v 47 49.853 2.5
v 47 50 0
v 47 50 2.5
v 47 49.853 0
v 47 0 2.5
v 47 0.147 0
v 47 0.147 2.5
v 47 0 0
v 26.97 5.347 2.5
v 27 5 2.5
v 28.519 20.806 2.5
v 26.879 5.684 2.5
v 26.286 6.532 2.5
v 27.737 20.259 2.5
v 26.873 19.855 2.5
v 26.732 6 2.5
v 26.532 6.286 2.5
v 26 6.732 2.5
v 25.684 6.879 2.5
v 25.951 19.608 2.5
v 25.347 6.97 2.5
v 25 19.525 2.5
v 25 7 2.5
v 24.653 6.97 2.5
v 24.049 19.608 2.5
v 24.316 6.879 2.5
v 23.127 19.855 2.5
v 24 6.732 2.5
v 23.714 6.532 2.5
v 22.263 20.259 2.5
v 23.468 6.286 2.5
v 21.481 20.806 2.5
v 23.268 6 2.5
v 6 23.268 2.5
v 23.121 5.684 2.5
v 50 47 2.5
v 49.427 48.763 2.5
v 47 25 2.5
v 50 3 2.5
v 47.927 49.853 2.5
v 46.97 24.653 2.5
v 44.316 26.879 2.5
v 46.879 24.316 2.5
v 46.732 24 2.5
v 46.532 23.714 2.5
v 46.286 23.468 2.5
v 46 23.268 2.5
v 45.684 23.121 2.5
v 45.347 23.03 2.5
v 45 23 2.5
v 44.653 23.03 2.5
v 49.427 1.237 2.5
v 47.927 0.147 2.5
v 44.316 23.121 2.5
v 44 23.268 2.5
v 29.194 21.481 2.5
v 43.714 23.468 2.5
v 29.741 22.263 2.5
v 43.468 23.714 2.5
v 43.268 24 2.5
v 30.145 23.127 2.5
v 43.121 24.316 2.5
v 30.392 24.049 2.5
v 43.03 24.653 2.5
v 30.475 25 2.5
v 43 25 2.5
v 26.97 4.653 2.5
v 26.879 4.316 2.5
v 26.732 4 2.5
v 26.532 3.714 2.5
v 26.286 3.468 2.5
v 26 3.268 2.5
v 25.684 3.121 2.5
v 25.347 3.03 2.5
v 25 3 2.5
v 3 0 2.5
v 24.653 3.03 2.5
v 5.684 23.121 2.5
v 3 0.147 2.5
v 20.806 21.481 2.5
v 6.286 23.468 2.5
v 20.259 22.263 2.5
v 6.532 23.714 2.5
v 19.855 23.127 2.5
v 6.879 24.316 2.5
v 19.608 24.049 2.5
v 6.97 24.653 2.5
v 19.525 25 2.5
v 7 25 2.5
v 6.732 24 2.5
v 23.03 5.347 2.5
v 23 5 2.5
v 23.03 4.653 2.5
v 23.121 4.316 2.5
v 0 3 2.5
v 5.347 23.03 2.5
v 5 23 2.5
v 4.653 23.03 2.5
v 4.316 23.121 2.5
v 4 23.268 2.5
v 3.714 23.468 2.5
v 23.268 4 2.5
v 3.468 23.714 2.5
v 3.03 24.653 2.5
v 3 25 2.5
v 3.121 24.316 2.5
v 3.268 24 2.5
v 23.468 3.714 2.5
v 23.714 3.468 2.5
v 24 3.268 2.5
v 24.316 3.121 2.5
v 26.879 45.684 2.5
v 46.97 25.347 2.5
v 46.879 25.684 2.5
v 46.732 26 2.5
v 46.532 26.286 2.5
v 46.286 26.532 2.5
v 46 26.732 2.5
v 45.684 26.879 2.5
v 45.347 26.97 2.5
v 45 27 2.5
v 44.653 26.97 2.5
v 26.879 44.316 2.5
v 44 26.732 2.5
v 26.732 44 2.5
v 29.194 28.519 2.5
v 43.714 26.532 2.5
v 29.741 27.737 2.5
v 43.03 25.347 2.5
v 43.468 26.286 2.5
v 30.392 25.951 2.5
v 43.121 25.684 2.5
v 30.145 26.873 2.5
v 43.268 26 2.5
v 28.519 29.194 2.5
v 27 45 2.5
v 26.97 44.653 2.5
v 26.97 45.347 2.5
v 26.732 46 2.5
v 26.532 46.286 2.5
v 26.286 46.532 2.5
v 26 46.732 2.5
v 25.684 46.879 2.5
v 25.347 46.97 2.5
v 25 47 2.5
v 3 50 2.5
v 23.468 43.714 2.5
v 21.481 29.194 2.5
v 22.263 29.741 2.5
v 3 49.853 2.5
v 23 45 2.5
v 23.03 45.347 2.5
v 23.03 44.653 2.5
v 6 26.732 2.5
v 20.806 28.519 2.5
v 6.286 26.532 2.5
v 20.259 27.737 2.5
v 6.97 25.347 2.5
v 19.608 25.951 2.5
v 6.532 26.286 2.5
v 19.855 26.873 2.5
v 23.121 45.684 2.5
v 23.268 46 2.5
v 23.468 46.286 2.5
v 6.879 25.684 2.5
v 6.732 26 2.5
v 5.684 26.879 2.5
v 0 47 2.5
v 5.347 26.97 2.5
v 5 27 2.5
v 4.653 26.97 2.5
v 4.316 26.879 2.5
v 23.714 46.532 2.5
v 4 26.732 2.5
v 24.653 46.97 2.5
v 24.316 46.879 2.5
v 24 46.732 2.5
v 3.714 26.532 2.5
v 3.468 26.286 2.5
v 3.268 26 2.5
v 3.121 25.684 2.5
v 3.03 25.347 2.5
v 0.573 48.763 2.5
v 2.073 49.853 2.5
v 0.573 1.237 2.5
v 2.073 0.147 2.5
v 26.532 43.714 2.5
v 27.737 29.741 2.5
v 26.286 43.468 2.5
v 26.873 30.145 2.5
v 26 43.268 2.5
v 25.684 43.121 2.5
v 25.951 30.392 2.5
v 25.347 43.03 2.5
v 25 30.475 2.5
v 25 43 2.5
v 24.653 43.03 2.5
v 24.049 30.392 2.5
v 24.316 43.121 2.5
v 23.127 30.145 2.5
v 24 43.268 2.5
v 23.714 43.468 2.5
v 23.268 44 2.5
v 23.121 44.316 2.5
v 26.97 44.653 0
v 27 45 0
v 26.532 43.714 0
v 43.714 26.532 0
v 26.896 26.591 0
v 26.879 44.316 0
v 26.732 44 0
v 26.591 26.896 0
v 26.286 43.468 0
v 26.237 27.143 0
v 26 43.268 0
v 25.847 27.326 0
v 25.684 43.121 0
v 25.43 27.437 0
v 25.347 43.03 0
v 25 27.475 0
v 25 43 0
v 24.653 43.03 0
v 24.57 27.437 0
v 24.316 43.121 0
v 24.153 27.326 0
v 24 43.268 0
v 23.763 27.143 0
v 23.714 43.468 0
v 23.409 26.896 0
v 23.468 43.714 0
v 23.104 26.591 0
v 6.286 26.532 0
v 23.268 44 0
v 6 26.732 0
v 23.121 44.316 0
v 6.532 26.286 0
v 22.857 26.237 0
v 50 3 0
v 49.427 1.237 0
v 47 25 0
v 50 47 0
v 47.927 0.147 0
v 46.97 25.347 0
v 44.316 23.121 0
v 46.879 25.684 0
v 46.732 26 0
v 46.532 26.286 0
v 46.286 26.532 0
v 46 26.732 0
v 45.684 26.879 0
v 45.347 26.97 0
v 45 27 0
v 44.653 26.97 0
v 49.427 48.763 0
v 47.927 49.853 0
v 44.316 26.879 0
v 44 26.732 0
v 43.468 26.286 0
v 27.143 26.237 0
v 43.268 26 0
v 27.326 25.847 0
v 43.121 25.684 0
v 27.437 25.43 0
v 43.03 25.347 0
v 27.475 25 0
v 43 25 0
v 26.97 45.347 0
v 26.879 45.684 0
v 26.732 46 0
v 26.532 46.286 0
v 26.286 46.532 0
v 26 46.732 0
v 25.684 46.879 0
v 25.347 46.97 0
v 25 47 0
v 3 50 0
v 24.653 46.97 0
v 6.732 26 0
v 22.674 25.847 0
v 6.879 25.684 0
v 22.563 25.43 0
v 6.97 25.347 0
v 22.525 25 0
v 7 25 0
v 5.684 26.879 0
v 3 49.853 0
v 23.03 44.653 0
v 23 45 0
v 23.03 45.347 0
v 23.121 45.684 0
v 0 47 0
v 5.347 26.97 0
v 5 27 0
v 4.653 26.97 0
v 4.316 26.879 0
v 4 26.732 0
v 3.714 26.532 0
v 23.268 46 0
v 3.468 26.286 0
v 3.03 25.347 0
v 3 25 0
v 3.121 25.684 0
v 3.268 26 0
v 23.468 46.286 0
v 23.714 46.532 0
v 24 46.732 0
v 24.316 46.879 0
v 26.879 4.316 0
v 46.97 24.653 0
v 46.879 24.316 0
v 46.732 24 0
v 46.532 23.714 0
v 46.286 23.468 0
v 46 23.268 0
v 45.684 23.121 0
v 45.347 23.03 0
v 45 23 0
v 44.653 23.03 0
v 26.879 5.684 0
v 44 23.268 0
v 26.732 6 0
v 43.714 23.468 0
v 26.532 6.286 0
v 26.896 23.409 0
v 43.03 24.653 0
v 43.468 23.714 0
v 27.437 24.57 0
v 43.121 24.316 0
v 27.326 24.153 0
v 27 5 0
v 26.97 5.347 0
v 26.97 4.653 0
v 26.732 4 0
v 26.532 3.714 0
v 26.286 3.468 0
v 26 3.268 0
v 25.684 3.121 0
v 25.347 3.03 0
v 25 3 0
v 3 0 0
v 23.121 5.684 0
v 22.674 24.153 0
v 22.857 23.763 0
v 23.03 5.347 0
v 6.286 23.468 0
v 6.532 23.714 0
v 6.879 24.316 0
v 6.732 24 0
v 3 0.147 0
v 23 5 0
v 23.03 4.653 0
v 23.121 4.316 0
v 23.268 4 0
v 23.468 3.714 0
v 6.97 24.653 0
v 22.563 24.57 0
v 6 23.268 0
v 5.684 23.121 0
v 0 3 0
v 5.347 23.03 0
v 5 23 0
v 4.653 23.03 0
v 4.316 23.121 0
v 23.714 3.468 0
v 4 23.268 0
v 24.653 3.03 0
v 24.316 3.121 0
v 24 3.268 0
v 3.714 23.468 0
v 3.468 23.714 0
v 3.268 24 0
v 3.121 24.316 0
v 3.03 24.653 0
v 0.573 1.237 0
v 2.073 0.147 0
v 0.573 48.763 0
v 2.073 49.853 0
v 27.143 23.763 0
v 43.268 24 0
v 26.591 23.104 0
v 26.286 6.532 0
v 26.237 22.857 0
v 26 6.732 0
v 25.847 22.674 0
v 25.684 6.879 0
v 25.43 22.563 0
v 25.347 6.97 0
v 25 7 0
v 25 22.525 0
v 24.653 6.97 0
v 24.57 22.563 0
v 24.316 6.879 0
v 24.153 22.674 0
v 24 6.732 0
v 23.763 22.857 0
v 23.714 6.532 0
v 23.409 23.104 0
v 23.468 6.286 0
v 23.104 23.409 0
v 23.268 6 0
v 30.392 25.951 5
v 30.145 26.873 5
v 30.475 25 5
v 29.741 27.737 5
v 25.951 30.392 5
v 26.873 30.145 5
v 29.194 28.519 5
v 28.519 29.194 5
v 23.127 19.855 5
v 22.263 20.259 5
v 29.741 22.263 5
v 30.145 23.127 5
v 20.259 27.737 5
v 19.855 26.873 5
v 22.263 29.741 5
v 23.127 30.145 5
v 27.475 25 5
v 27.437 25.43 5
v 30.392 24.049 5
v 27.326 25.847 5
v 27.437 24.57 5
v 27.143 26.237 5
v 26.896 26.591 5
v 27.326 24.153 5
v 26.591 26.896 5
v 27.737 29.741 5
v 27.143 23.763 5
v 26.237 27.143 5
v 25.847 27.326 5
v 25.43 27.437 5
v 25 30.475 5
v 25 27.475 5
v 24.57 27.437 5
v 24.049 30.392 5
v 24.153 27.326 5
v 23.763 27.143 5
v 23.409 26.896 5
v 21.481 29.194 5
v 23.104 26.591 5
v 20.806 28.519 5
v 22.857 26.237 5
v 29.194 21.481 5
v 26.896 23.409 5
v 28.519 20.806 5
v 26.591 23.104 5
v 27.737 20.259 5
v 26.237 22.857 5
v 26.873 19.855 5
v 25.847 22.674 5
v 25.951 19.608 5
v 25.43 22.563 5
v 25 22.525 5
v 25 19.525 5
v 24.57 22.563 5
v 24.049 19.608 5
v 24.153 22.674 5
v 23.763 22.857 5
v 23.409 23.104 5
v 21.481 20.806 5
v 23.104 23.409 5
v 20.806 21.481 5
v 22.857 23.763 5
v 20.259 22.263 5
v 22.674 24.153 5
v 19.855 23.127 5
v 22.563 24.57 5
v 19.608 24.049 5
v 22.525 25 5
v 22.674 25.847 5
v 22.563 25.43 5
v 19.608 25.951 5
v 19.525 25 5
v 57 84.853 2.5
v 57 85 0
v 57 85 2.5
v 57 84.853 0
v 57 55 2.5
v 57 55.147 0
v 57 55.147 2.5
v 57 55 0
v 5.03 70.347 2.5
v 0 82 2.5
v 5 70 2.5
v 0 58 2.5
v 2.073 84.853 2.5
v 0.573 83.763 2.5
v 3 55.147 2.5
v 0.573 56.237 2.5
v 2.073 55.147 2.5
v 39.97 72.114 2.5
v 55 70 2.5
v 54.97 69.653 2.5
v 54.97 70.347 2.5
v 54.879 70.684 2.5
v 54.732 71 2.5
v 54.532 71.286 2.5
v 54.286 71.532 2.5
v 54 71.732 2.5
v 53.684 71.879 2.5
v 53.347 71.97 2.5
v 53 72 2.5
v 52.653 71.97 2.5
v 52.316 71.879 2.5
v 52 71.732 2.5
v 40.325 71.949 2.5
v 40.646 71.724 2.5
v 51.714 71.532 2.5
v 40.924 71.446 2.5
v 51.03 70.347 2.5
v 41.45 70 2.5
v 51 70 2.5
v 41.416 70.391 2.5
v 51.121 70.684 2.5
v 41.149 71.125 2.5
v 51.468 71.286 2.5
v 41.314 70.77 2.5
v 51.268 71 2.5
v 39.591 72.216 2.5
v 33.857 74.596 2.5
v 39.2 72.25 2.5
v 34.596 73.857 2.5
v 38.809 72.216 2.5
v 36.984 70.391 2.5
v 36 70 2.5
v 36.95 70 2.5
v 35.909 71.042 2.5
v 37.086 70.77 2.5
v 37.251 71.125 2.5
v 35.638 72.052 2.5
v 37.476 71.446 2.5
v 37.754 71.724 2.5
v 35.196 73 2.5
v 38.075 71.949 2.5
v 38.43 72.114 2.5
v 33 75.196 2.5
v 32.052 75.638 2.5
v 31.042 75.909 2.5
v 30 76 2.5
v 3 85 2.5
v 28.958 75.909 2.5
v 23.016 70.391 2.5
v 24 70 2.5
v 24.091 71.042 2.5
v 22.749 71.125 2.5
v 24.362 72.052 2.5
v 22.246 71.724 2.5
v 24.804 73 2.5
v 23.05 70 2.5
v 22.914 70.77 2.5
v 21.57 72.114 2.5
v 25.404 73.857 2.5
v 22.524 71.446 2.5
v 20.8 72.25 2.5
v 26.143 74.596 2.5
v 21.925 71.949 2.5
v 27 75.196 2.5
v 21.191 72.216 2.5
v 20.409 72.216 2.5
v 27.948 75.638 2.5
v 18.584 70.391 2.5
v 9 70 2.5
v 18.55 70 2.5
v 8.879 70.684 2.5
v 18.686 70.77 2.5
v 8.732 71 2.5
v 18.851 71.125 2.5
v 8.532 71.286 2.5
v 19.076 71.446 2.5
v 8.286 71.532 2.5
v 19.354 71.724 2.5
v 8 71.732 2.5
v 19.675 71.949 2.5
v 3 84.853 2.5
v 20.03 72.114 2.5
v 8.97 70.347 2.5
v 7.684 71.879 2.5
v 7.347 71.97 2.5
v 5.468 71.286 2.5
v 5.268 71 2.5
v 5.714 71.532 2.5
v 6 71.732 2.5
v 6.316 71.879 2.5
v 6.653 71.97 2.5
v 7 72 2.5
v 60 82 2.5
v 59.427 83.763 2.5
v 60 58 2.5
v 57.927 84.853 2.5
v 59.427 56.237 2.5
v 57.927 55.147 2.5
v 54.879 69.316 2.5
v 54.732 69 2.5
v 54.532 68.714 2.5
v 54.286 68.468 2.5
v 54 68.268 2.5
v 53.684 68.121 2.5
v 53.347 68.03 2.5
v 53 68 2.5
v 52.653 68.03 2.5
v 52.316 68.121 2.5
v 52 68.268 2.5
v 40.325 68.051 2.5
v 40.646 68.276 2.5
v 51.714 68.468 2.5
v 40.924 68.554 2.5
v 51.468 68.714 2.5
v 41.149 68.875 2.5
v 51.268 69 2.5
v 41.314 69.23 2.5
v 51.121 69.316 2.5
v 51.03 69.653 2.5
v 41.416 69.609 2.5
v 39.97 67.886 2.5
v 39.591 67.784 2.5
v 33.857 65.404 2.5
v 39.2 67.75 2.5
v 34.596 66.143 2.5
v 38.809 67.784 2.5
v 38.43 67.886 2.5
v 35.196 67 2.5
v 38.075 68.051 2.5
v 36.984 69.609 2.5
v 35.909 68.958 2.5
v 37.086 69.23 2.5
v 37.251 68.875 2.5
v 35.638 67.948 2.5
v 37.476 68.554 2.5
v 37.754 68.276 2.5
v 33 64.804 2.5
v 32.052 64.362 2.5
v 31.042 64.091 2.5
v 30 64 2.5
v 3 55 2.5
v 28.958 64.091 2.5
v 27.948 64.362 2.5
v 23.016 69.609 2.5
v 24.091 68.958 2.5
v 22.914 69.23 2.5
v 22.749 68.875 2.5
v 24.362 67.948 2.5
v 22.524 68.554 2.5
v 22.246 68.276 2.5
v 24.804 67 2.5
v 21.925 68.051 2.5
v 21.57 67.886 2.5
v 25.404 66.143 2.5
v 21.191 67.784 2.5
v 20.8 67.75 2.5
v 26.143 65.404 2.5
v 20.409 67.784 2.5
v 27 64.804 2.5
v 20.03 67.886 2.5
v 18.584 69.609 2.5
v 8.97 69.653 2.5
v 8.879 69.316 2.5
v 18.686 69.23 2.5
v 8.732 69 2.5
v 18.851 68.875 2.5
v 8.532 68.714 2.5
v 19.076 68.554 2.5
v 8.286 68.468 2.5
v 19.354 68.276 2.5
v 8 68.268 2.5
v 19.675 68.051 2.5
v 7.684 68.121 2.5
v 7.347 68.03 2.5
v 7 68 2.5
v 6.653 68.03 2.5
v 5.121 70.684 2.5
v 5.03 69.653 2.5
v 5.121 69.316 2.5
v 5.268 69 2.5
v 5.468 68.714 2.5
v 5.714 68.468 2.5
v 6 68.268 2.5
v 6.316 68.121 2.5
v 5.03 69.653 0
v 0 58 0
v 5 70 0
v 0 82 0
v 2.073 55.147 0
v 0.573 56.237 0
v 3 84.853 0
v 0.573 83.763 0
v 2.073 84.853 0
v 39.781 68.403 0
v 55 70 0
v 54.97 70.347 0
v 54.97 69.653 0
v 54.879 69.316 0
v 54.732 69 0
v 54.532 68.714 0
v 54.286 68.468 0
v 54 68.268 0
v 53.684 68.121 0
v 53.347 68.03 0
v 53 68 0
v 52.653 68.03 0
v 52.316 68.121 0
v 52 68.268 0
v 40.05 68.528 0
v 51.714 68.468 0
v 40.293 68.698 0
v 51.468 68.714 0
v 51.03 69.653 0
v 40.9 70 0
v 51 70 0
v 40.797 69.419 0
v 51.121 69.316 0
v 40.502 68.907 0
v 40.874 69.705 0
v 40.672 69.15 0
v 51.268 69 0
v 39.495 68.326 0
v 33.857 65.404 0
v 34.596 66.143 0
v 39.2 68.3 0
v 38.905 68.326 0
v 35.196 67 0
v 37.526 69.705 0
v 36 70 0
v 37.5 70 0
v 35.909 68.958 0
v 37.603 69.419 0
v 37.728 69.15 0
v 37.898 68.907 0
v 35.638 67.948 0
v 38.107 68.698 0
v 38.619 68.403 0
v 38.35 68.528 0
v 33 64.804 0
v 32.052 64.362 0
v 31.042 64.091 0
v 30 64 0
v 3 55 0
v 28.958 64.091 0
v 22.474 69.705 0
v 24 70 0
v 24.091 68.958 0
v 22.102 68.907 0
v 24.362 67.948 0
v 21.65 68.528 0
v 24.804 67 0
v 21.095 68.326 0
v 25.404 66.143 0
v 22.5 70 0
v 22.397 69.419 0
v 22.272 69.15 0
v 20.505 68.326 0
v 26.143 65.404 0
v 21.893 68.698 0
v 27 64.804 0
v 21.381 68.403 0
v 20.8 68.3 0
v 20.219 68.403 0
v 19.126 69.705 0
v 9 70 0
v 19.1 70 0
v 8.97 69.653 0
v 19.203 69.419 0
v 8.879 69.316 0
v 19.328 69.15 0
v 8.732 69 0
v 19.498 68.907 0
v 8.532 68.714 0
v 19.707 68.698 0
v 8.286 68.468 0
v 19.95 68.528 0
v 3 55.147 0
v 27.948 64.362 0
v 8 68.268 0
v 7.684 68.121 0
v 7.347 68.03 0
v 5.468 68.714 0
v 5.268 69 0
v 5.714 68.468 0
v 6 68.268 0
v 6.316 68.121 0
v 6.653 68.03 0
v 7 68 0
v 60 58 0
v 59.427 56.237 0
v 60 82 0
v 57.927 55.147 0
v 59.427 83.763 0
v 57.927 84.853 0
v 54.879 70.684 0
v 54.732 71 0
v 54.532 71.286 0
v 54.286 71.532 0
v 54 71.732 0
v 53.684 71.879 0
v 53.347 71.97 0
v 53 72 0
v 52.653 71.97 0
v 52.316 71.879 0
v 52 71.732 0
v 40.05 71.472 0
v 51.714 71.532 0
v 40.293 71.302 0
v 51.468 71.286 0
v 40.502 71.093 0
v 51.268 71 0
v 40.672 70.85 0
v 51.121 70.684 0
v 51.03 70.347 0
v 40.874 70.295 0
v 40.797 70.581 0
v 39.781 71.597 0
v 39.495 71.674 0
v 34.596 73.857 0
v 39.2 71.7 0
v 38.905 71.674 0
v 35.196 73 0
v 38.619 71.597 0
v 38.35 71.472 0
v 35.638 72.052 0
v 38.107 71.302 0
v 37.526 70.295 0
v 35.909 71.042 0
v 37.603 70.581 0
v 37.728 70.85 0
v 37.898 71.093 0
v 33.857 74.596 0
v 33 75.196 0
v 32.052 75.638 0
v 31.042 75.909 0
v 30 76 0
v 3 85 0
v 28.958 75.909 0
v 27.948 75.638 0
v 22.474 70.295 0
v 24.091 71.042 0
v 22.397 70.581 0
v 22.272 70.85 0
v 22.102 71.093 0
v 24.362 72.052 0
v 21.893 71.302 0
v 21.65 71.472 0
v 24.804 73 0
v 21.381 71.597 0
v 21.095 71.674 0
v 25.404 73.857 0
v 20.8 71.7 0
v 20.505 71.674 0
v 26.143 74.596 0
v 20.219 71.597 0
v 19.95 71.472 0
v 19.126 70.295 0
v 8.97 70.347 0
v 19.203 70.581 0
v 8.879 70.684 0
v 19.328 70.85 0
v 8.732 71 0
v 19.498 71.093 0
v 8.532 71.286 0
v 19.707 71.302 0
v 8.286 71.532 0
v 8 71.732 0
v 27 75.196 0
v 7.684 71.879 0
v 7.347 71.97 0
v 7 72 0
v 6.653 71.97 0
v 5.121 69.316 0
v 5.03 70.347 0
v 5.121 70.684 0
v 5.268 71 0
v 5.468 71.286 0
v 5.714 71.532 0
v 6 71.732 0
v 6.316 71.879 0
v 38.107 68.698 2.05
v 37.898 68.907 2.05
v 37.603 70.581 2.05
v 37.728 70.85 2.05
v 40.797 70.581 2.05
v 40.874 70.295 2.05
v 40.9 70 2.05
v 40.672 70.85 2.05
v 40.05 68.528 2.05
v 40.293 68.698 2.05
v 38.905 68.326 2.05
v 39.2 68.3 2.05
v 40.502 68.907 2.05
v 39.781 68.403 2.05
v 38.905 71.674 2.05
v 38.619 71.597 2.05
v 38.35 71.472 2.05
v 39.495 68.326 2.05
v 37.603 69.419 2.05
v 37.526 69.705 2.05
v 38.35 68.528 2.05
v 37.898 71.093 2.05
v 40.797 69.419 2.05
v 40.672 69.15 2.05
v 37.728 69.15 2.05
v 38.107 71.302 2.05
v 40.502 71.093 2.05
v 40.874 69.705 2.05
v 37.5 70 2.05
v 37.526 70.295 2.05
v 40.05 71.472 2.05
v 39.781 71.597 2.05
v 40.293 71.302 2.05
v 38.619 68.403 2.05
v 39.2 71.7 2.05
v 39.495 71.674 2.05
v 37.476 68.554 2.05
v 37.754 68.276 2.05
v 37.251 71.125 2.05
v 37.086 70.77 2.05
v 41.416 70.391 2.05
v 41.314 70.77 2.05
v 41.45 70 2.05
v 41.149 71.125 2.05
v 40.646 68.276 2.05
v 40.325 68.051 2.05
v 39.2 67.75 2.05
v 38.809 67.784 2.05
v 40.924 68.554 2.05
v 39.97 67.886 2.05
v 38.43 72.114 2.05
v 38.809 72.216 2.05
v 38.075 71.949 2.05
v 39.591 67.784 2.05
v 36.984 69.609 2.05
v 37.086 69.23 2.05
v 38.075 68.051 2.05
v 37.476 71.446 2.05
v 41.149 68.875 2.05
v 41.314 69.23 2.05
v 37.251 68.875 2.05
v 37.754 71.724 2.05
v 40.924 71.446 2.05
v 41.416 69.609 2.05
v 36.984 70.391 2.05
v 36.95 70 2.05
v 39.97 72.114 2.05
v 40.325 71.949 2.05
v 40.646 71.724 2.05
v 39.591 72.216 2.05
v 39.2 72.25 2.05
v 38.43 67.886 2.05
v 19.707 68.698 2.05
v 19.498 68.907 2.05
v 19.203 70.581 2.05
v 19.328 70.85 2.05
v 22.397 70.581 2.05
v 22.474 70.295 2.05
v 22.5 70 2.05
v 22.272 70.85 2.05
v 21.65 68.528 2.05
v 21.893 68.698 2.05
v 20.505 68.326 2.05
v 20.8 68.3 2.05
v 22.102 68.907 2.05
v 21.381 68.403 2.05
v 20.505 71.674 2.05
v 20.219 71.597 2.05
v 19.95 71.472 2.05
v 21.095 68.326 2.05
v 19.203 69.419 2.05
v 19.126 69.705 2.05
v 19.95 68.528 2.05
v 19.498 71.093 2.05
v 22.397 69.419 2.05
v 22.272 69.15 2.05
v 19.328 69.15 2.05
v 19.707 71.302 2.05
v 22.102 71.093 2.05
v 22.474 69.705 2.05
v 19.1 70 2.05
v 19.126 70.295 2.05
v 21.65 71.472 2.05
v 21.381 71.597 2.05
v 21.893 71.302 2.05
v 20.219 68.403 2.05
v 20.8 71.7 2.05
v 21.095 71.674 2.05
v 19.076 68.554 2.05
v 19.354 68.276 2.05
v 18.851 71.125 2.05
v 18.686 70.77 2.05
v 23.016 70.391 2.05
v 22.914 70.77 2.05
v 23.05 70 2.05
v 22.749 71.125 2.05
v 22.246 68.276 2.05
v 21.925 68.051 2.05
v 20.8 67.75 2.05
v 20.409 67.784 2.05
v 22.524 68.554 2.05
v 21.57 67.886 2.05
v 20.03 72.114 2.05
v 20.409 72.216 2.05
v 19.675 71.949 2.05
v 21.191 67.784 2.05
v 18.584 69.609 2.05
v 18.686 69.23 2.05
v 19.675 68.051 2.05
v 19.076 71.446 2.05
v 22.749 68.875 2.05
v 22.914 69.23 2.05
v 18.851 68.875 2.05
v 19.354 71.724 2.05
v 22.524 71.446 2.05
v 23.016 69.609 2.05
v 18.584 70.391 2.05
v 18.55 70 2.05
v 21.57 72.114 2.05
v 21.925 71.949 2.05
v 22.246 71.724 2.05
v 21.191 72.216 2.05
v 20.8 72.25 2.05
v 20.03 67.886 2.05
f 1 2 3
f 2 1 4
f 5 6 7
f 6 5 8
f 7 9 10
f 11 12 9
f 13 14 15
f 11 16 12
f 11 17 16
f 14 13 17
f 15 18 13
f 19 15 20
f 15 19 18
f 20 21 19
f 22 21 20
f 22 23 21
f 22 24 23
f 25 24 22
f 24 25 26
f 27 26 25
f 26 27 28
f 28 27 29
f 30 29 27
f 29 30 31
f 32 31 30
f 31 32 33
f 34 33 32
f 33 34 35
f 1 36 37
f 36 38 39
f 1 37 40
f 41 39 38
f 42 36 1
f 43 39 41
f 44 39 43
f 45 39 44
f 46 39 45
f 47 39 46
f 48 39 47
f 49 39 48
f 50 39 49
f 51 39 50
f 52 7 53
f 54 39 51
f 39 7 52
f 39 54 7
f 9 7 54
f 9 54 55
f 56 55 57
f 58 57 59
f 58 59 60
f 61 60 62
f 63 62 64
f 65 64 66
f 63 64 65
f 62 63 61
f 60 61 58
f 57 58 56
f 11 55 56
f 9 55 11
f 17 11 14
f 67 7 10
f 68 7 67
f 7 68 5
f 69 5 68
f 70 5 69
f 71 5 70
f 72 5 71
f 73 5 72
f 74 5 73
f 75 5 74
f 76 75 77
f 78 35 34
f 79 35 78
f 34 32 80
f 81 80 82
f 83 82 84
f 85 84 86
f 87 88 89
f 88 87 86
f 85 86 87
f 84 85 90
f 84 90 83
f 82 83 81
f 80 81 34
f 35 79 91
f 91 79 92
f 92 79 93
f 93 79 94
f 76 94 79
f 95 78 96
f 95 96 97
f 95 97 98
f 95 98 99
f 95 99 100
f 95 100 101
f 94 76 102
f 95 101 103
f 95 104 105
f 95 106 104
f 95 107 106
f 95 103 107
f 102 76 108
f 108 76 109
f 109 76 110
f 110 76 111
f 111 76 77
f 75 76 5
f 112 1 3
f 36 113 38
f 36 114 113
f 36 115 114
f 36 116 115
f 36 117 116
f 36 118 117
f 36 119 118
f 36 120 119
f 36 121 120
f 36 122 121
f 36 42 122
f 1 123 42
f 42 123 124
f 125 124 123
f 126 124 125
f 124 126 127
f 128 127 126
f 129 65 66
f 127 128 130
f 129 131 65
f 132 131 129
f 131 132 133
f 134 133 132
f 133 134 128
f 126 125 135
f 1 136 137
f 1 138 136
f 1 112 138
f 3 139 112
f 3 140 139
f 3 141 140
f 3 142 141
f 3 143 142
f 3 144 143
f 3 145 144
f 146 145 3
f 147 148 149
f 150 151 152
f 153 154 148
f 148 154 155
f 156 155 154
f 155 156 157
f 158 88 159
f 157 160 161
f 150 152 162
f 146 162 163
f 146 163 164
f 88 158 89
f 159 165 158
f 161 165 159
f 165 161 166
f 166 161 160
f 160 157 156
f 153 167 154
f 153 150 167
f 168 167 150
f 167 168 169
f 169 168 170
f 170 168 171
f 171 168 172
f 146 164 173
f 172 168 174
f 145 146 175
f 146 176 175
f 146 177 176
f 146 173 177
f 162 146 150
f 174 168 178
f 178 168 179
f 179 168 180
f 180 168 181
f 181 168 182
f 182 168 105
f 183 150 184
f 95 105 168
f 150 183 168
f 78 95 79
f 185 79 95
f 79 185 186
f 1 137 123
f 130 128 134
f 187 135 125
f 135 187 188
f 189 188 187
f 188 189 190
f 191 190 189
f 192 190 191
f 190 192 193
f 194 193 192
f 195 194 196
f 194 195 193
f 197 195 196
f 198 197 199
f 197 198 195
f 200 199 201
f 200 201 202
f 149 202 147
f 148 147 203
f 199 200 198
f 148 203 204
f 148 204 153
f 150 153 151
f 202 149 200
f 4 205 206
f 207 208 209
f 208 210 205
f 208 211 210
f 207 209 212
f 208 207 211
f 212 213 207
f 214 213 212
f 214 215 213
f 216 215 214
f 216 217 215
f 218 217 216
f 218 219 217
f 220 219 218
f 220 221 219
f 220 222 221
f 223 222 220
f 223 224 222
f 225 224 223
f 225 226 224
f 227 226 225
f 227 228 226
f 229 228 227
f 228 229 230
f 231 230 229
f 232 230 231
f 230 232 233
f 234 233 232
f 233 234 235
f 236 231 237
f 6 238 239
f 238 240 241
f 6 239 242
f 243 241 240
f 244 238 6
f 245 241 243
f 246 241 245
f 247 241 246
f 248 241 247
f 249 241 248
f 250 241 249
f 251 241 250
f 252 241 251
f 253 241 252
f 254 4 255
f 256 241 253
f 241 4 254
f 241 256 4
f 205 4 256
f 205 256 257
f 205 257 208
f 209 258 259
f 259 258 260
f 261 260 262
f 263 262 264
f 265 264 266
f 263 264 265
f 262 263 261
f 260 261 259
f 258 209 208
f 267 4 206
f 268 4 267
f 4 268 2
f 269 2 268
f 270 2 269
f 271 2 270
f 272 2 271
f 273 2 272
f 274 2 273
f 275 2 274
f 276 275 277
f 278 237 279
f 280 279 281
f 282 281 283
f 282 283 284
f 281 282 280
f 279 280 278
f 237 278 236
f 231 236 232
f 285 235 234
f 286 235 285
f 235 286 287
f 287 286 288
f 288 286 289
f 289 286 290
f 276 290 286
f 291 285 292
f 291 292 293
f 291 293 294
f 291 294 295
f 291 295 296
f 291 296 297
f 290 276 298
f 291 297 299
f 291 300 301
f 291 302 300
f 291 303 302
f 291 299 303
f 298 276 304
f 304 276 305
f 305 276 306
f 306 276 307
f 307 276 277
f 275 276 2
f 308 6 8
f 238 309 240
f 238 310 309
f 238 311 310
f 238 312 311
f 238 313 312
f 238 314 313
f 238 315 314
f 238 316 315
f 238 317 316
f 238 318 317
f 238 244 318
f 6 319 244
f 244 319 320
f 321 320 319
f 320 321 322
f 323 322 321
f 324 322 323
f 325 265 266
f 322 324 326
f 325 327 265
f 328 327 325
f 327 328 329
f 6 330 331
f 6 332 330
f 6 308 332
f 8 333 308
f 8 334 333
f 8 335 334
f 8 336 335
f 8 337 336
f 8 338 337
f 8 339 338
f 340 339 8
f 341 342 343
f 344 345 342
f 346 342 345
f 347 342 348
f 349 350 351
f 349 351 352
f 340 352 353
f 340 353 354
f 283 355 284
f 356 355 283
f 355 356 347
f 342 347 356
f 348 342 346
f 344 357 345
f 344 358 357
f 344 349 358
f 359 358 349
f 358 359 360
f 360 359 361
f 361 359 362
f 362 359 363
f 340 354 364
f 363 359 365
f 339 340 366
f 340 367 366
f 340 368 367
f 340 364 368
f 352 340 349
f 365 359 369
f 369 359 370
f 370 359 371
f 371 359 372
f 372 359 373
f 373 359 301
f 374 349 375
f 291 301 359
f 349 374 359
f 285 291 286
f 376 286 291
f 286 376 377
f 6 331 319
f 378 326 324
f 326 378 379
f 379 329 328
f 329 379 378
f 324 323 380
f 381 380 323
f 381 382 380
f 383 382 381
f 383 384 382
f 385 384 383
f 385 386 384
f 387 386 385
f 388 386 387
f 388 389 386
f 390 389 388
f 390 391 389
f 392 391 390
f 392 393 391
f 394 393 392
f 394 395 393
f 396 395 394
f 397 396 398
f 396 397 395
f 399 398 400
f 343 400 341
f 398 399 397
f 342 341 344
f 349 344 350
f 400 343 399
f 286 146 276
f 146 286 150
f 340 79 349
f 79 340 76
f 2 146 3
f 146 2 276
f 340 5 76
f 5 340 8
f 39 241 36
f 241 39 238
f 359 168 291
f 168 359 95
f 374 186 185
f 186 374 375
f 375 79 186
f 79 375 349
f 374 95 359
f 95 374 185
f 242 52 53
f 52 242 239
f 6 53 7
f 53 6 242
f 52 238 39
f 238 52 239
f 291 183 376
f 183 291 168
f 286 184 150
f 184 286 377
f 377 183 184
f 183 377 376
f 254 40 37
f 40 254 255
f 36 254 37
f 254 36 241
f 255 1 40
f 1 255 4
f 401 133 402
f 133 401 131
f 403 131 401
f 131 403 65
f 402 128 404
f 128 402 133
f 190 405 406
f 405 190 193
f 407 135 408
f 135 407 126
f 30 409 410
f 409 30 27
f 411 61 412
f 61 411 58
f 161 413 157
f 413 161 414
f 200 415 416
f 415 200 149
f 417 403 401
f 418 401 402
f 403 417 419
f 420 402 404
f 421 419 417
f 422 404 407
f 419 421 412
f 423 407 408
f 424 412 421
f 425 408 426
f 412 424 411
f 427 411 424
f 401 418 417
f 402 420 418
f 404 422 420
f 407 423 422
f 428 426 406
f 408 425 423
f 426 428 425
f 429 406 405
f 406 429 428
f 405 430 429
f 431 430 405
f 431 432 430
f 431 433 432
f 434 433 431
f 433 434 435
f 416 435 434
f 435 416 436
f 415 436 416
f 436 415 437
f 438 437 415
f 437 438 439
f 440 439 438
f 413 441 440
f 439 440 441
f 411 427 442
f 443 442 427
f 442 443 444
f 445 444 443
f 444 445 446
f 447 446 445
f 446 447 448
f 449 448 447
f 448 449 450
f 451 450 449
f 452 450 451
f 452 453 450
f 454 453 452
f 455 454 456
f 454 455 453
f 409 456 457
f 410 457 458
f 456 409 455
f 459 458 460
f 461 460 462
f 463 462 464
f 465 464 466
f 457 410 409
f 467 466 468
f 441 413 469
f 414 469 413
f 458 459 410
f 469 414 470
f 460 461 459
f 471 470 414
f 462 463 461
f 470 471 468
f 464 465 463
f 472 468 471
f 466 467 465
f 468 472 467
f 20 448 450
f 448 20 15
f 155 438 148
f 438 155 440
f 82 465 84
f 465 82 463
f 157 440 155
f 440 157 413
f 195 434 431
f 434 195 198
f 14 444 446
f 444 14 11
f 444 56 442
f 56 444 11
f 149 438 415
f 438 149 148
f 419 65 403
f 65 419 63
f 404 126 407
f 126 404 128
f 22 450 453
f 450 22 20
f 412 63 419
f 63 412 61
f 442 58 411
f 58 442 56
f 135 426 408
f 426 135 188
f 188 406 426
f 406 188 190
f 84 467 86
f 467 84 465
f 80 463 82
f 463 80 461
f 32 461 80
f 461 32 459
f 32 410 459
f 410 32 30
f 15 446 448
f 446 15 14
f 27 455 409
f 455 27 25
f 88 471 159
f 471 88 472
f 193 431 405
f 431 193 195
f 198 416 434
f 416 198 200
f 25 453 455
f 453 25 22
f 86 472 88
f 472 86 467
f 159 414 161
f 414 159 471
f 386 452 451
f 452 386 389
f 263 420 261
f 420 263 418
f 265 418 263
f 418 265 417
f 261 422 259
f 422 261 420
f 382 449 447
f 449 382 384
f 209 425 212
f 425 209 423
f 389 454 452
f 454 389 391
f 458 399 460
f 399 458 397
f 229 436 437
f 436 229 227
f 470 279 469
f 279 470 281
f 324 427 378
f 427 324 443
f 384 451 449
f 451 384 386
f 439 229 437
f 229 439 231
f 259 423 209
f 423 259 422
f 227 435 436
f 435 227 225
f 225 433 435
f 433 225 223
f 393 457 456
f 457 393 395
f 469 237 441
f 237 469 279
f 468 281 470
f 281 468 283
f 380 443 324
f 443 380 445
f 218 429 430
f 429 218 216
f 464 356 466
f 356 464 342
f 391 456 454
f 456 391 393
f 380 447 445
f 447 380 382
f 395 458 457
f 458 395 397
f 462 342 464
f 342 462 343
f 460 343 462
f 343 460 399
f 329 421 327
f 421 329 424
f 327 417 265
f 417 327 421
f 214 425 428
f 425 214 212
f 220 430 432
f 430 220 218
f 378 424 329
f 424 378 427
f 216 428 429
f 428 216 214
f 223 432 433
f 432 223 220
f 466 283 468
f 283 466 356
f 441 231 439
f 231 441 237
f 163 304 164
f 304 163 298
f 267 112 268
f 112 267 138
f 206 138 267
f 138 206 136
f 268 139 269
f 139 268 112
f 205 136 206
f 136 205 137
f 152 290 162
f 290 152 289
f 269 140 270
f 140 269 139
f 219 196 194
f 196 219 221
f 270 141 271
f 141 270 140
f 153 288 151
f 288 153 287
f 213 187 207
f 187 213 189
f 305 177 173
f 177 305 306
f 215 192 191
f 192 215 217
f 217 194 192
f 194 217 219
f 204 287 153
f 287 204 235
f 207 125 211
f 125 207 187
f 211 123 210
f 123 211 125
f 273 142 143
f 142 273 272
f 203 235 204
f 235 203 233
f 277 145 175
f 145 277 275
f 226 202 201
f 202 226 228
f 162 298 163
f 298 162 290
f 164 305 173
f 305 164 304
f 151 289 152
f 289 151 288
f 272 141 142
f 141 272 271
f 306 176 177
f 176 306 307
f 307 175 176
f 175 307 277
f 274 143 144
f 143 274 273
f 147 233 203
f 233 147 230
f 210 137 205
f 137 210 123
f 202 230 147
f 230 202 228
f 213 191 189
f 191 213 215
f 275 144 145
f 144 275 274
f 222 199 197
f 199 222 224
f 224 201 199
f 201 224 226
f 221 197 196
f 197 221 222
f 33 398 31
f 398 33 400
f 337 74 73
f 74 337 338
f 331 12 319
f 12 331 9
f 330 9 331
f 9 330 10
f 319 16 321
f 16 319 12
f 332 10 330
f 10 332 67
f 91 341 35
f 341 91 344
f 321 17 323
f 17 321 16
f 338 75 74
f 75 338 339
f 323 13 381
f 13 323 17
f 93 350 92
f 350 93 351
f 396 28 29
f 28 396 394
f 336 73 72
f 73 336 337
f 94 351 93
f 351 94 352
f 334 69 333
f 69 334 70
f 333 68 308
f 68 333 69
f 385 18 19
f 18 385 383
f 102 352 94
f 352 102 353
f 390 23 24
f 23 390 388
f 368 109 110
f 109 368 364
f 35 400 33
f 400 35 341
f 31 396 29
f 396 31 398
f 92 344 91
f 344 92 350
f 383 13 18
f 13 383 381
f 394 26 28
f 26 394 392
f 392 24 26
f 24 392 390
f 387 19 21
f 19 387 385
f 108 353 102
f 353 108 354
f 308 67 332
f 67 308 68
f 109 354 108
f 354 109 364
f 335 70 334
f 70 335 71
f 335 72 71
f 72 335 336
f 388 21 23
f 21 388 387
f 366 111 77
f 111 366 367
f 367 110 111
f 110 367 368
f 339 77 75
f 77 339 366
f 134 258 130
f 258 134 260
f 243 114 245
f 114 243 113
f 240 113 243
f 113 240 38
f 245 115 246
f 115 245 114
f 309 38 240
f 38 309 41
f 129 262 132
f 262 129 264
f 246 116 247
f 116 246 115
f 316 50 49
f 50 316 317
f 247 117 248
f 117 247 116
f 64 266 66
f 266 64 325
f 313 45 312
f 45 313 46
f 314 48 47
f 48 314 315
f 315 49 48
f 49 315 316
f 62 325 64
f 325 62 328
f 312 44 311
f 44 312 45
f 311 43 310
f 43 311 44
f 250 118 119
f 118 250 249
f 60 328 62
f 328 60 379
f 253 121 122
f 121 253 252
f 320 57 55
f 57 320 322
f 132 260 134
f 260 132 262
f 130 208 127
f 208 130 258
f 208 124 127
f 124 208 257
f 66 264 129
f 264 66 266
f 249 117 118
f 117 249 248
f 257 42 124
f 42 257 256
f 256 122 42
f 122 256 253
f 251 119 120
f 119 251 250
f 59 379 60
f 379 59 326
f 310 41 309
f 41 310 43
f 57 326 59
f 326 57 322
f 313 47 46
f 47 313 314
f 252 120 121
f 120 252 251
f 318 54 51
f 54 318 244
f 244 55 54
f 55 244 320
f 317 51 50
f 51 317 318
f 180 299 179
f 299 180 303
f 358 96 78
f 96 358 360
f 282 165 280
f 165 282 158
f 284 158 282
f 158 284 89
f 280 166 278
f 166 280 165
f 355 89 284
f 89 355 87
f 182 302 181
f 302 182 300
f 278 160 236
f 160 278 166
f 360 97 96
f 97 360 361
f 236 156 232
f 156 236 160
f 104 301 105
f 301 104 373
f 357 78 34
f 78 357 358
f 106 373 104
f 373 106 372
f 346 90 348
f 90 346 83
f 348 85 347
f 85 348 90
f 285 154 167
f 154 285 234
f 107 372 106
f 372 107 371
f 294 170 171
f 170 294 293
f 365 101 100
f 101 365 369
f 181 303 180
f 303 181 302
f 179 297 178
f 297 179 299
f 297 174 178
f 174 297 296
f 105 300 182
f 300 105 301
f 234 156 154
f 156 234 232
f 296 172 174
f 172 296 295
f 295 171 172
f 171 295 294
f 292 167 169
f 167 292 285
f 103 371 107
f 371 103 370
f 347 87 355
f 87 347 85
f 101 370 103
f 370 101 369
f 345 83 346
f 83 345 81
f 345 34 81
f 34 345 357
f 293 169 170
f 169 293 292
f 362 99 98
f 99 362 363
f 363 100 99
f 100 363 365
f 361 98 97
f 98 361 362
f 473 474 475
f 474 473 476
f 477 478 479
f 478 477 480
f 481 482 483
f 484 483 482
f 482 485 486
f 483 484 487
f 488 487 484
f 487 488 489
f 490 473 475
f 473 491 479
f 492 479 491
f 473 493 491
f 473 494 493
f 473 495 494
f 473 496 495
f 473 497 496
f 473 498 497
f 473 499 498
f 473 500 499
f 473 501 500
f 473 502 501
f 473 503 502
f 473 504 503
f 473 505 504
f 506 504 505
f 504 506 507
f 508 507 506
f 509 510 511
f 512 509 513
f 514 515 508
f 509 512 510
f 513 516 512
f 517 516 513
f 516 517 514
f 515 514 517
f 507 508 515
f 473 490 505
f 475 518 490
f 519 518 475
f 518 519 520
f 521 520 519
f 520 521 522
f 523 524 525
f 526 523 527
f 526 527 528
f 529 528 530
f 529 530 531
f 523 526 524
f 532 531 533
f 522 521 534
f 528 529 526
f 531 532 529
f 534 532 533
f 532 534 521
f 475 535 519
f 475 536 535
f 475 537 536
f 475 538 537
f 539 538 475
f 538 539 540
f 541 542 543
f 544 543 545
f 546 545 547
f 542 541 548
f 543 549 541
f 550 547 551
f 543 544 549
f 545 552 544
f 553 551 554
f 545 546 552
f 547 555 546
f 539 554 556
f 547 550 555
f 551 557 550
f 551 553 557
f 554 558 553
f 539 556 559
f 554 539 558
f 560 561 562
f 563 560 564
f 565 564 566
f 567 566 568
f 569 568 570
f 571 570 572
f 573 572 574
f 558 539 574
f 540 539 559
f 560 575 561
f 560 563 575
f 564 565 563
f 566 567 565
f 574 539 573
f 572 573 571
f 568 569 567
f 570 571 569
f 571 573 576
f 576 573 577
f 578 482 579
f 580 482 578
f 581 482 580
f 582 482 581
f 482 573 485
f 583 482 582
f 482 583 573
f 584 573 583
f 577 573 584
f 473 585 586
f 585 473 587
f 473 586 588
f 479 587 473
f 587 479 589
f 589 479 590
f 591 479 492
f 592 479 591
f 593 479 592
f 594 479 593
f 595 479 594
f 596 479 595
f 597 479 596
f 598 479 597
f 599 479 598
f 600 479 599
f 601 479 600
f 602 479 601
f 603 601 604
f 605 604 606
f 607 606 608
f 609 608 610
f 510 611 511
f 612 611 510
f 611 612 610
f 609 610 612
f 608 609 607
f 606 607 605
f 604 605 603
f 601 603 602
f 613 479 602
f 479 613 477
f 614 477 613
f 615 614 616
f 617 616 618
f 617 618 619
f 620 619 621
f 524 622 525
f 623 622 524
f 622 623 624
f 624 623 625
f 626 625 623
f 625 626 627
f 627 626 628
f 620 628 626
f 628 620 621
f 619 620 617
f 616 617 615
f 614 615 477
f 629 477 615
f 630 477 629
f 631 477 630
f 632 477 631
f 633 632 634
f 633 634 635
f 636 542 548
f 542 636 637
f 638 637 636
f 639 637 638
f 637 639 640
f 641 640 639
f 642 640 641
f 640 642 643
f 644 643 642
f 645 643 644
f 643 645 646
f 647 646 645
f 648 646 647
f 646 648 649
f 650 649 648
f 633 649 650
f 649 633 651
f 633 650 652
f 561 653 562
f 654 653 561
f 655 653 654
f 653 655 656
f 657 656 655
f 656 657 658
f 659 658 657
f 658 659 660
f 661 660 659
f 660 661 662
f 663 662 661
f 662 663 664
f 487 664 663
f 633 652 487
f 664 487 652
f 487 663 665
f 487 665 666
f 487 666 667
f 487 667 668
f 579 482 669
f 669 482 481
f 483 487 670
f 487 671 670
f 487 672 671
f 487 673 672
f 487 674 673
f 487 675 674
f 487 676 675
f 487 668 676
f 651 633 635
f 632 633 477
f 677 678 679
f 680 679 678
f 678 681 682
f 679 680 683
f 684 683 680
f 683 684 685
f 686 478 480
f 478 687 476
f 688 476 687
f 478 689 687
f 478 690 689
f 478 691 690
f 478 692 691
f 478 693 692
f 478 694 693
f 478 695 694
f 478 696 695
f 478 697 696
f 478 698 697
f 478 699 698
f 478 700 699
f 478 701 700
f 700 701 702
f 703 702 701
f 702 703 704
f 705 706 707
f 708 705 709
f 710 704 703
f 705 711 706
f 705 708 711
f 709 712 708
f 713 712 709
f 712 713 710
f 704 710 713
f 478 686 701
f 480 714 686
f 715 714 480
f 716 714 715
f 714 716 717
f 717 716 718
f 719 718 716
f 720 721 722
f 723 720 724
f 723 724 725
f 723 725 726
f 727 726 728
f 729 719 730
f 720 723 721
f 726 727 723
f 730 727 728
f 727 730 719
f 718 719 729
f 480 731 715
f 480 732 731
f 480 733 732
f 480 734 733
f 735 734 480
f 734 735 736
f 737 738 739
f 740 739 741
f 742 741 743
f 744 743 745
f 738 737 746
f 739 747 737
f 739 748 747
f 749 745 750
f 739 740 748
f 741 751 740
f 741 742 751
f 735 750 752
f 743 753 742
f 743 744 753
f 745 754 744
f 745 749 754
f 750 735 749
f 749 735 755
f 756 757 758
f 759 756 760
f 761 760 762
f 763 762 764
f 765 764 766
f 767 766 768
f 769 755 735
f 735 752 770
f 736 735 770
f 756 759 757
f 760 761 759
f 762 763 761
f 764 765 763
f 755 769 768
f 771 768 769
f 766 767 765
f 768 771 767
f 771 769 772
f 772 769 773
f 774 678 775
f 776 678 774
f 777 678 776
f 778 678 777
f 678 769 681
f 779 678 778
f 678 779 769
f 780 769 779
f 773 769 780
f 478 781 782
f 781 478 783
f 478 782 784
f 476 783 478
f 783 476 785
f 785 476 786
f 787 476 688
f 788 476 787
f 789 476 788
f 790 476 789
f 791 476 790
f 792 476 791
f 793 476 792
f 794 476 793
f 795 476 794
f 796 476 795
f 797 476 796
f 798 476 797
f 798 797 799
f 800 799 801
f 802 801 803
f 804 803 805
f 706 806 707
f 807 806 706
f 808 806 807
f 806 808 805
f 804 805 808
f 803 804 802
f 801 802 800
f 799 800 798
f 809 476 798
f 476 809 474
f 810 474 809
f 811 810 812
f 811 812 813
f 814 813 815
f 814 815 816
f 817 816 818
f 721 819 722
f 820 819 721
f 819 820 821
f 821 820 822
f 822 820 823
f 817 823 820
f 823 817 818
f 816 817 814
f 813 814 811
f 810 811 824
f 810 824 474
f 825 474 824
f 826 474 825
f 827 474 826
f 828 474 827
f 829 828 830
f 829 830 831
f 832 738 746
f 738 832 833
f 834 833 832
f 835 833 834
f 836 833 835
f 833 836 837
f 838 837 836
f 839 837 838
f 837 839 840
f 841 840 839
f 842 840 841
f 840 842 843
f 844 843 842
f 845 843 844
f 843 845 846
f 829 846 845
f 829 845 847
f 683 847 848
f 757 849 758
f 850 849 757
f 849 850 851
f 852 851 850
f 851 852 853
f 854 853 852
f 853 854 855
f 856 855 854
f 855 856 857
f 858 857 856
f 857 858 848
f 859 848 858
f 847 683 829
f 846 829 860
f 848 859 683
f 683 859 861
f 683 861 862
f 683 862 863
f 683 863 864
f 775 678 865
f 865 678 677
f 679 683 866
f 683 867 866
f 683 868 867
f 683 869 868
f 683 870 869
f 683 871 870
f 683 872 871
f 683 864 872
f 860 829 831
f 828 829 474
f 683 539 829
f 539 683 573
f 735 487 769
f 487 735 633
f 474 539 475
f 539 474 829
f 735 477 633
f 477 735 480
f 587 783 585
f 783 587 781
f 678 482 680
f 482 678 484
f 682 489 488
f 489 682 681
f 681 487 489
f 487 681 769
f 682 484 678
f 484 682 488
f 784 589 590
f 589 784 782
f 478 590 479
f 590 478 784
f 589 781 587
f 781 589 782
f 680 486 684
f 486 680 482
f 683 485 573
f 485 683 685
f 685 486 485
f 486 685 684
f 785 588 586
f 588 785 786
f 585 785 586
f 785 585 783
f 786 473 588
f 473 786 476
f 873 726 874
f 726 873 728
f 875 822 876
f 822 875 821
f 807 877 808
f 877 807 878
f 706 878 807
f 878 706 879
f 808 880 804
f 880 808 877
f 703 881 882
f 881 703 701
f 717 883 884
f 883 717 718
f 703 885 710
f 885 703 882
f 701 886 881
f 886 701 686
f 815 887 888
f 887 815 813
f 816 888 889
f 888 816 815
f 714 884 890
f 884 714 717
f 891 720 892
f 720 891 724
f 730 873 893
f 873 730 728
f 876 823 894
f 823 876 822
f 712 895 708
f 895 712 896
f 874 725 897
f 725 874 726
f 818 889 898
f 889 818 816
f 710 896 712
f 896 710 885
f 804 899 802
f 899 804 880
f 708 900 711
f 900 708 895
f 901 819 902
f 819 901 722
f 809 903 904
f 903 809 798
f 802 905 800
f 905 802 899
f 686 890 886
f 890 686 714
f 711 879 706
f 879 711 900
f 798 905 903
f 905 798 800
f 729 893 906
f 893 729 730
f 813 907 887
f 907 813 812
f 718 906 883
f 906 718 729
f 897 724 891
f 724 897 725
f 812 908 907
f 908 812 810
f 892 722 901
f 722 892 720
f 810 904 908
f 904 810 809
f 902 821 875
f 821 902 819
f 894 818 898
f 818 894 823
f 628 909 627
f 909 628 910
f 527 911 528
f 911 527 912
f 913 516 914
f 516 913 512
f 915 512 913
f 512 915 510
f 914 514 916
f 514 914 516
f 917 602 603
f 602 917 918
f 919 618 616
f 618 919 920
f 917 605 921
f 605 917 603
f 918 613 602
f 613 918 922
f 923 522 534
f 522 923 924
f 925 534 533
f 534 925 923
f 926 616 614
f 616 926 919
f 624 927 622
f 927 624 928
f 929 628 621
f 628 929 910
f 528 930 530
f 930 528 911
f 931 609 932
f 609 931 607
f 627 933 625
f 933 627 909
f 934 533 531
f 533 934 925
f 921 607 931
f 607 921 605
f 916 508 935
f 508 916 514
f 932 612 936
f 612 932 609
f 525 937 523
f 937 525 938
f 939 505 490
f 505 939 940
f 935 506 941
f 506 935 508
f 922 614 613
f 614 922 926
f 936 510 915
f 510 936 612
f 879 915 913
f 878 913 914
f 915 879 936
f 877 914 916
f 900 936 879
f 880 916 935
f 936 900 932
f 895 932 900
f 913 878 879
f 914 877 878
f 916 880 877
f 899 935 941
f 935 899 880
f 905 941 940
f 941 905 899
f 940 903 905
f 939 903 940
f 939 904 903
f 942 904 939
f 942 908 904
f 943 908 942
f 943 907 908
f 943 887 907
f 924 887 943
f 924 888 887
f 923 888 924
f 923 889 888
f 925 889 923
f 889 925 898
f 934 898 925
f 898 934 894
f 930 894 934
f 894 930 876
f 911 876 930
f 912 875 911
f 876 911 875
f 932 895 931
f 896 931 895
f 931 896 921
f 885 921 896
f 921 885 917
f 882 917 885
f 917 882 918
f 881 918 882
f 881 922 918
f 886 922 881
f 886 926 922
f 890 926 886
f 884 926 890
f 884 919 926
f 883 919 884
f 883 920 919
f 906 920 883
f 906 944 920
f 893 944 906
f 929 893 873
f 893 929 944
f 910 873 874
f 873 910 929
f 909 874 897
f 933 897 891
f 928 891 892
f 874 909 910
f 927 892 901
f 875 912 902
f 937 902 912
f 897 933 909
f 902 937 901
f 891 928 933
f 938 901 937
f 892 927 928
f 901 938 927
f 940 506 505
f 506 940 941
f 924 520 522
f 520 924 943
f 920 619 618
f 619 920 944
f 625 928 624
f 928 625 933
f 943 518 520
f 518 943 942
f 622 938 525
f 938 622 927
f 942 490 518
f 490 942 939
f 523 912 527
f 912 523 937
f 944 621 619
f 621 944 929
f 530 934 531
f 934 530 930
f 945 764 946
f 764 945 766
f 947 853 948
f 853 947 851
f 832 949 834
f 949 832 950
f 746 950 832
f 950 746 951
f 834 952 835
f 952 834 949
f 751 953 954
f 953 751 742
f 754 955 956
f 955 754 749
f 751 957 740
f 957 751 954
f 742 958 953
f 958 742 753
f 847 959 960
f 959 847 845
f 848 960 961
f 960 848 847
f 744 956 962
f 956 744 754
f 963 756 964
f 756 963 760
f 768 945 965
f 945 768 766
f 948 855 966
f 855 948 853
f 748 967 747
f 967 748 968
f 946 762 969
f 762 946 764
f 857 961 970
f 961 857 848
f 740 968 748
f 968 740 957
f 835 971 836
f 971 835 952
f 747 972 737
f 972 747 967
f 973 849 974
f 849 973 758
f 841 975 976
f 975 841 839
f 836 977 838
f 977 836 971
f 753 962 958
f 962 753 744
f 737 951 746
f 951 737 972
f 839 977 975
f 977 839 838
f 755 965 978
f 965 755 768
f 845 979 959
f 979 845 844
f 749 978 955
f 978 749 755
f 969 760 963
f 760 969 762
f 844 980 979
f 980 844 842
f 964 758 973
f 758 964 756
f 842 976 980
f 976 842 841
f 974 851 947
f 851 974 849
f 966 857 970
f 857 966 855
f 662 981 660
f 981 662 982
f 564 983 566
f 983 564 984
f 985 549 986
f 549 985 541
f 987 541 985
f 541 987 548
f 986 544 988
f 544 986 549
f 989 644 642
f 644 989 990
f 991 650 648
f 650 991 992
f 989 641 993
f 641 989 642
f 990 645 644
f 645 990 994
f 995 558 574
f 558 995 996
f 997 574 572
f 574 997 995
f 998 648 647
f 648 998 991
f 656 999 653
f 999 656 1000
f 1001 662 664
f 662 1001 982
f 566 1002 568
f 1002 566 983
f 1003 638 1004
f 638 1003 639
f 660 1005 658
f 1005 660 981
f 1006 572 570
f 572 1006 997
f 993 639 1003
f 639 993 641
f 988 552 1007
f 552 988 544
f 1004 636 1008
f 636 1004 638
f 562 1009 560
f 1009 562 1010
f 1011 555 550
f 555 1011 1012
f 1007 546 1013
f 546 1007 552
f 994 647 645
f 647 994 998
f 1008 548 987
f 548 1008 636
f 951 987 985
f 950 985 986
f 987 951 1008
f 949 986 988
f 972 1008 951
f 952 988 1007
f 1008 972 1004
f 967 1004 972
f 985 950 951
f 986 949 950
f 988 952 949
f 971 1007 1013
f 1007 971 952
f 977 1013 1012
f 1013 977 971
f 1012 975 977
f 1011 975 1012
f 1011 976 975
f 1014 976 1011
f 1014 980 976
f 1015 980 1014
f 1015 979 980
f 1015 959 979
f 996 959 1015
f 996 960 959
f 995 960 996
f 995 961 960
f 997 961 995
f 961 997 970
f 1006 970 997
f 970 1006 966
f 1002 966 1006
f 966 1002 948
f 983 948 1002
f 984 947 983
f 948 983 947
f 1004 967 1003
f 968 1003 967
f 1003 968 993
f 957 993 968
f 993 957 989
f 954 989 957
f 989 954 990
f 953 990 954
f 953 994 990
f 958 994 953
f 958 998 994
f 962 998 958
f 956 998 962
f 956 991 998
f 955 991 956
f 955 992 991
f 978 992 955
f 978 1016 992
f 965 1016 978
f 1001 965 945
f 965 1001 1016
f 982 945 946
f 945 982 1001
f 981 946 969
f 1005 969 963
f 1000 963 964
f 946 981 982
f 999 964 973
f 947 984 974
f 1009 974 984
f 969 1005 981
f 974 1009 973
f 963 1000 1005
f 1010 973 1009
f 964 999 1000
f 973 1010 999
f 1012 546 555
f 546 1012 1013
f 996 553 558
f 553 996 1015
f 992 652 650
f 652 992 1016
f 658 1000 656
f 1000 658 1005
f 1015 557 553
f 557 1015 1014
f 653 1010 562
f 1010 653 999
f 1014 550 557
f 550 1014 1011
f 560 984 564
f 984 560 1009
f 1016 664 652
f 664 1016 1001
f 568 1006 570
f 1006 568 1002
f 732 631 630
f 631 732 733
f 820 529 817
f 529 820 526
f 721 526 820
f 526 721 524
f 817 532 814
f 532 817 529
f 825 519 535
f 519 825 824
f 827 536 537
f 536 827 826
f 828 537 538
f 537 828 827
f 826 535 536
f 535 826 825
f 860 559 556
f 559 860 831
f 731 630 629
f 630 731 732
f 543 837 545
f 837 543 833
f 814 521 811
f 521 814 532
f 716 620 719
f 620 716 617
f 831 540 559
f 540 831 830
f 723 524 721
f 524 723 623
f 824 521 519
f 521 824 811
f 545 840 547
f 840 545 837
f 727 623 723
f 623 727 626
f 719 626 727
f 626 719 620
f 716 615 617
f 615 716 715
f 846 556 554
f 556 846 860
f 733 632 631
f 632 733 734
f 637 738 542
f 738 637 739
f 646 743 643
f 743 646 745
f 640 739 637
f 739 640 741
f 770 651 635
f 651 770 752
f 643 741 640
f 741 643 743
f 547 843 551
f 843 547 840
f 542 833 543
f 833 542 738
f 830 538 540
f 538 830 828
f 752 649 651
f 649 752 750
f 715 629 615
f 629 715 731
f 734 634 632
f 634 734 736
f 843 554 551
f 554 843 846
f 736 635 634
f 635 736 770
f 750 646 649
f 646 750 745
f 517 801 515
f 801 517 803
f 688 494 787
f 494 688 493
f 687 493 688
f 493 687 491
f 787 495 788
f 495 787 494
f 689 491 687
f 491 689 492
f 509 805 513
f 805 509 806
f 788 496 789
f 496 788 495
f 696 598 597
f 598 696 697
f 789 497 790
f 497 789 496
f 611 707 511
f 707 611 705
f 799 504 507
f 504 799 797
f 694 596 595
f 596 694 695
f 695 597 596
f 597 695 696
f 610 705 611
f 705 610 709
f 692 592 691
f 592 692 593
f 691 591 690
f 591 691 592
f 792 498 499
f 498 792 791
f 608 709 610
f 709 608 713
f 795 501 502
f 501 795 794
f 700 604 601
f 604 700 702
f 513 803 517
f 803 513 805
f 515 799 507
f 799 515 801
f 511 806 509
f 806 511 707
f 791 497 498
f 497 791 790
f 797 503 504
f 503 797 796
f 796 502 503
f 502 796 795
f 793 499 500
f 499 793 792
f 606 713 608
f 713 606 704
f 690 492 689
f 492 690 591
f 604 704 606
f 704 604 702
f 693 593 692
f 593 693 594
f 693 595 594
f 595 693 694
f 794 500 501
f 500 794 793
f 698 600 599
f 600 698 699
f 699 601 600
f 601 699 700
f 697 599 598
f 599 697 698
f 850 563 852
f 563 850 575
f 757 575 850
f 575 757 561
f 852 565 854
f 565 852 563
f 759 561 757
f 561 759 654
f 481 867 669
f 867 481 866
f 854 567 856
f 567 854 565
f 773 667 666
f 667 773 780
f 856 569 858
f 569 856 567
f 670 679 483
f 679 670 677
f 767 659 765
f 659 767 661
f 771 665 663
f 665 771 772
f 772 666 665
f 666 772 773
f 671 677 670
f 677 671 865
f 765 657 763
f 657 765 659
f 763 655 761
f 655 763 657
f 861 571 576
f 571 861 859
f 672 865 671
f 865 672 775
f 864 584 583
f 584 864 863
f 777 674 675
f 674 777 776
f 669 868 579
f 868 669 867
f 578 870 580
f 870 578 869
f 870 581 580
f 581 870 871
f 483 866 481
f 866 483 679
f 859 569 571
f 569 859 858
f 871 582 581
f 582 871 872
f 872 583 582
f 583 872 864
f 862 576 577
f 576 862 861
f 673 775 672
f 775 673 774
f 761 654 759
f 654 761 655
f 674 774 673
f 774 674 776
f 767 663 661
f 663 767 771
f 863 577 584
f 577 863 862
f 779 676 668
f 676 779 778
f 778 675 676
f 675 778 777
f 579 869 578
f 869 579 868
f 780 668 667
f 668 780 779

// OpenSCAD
// Customizable Rotable Bowden Extruder 
// preview[view:south, tilt:top];

// Which one would you like to see?
part = "both"; // [top:Motor Base,bottom:Bearing Base,both:Motor and Bearing Base]



/* [Motor Base] */

//Motor base width 
motor_base_size_x = 60;

//Motor base length 
motor_base_size_y = 30;

//Motor base height 
motor_base_size_z = 2.5;

//
bearing_top_central_hole_diameter =  12;

//
bearing_top_screw_head_diameter = 4.5;

//
bearing_top_screw_hole_diameter = 3.4;

//
bearing_top_screw_height = 4.5;

//distant between bearing top screw hole and the central
bearing_top_screw_hole_position = 9.2;

//motor width
motor_width = 42;

//
motor_holder_diameter = 4;


/* [Bearing Base] */

//Hard Disk bearing base width (mm)
bearing_base_size_x = 50;

//Hard Disk bearing base length 
bearing_base_size_y = 50;

//Hard Disk bearing base height 
bearing_base_size_z = 2.5;

//Central hole diameter    
base_central_hole_diameter = 4.95;

//Base screw diameter 
base_screw_diameter = 4;

//The distant between the screw and the central
base_screw_position = 20;



/* [Hidden] */
bearing_top_screw_head_hole_height = motor_base_size_z -bearing_top_screw_height/2;



module rounded(size, r) {
    //2 cube + 4 cylinder
    union() {
        translate([r, 0, 0]) cube([size[0]-2*r, size[1], size[2]]);
        translate([0, r, 0]) cube([size[0], size[1]-2*r, size[2]]);
        translate([r, r, 0]) cylinder(h=size[2], r=r);
        translate([size[0]-r, r, 0]) cylinder(h=size[2], r=r);
        translate([r, size[1]-r, 0]) cylinder(h=size[2], r=r);
        translate([size[0]-r, size[1]-r, 0]) cylinder(h=size[2], r=r);
    }
}

//bearing base
module bearingBase() {
    difference() {
        union() {
            //bearing base
            rounded([bearing_base_size_x, bearing_base_size_y, bearing_base_size_z], 3);
            //bearing central
            translate ([bearing_base_size_x/2,bearing_base_size_y/2,0]) {
                cylinder(h=(bearing_base_size_z+2.5), d=(base_central_hole_diameter+6),center=false, $fn=36);
            }
        }
        //bearing central hole
        translate ([bearing_base_size_x/2,bearing_base_size_y/2,-0.2]) {
            cylinder(h=bearing_base_size_z+2.5+1, d=base_central_hole_diameter, center=false, $fn=36);
        }
    
        //screw hole up
        translate ([bearing_base_size_x/2,bearing_base_size_y/2+base_screw_position,-0.2]) {
            cylinder(h=bearing_base_size_z+1, d=base_screw_diameter, center=false, $fn=36);
        }
    
        //screw hole down
        translate ([bearing_base_size_x/2,bearing_base_size_y/2-base_screw_position,-0.2]) {
            cylinder(h=bearing_base_size_z+1, d=base_screw_diameter, center=false, $fn=36);
        }

        //screw hole right
        translate ([bearing_base_size_x/2+base_screw_position,bearing_base_size_y/2, -0.2]) {
            cylinder(h=bearing_base_size_z+1, d=base_screw_diameter, center=false, $fn=36);
        }
    
        //screw hole left
        translate ([bearing_base_size_x/2-base_screw_position,bearing_base_size_y/2, -0.2]) {
            cylinder(h=bearing_base_size_z+10+1, d=base_screw_diameter, center=false, $fn=36);
        }
    }
}


//motor base
module motorBase () {
    difference() {
        //base
        rounded([motor_base_size_x, motor_base_size_y, motor_base_size_z], 3);
        //bearing top central hole 
        translate ([motor_base_size_x/2,motor_base_size_y/2,-0.2]) {
            cylinder(h=motor_base_size_z+1, d=bearing_top_central_hole_diameter,center=false, $fn=36);
        }
        
        //bearing screw hole (right)
        translate ([motor_base_size_x/2+bearing_top_screw_hole_position,motor_base_size_y/2,-0.2]) {
            union () {
                cylinder(h=motor_base_size_z+1, d=bearing_top_screw_hole_diameter,center=false, $fn=36);
                translate ([0,0,bearing_top_screw_height/2]) {
                    cylinder(h=bearing_top_screw_head_hole_height+1, d=bearing_top_screw_head_diameter,center=false, $fn=36);
                }
            }
        }
        //bearing screw hole (left)
        translate ([motor_base_size_x/2-bearing_top_screw_hole_position,motor_base_size_y/2,-0.2]) {
            union () {
                cylinder(h=motor_base_size_z+1, d=bearing_top_screw_hole_diameter,center=false, $fn=36);
                translate ([0,0,bearing_top_screw_height/2]) {
                    cylinder(h=bearing_top_screw_head_hole_height+1, d=bearing_top_screw_head_diameter,center=false, $fn=36);
                }
            }
        }
        
        //motor holder hole (right)
        translate ([motor_base_size_x/2+motor_width/2+motor_holder_diameter/2,motor_base_size_y/2,-0.2]) {
        cylinder(h=motor_base_size_z+1, d=motor_holder_diameter,center=false, $fn=36);
        }
        //motor holder hole (left)
        translate ([motor_base_size_x/2-motor_width/2-motor_holder_diameter/2,motor_base_size_y/2,-0.2]) {
        cylinder(h=motor_base_size_z+1, d=motor_holder_diameter,center=false, $fn=36);
        }
    }

}

module both() {
    bearingBase();
    translate ([0,bearing_base_size_y+5, 0]) {
        motorBase();
    }
}

module print_part() {
	if (part == "top") {
		motorBase();
	} else if (part == "bottom") {
		bearingBase();
	} else if (part == "both") {
		both();
	} else {
		both();
	}
}

print_part();
